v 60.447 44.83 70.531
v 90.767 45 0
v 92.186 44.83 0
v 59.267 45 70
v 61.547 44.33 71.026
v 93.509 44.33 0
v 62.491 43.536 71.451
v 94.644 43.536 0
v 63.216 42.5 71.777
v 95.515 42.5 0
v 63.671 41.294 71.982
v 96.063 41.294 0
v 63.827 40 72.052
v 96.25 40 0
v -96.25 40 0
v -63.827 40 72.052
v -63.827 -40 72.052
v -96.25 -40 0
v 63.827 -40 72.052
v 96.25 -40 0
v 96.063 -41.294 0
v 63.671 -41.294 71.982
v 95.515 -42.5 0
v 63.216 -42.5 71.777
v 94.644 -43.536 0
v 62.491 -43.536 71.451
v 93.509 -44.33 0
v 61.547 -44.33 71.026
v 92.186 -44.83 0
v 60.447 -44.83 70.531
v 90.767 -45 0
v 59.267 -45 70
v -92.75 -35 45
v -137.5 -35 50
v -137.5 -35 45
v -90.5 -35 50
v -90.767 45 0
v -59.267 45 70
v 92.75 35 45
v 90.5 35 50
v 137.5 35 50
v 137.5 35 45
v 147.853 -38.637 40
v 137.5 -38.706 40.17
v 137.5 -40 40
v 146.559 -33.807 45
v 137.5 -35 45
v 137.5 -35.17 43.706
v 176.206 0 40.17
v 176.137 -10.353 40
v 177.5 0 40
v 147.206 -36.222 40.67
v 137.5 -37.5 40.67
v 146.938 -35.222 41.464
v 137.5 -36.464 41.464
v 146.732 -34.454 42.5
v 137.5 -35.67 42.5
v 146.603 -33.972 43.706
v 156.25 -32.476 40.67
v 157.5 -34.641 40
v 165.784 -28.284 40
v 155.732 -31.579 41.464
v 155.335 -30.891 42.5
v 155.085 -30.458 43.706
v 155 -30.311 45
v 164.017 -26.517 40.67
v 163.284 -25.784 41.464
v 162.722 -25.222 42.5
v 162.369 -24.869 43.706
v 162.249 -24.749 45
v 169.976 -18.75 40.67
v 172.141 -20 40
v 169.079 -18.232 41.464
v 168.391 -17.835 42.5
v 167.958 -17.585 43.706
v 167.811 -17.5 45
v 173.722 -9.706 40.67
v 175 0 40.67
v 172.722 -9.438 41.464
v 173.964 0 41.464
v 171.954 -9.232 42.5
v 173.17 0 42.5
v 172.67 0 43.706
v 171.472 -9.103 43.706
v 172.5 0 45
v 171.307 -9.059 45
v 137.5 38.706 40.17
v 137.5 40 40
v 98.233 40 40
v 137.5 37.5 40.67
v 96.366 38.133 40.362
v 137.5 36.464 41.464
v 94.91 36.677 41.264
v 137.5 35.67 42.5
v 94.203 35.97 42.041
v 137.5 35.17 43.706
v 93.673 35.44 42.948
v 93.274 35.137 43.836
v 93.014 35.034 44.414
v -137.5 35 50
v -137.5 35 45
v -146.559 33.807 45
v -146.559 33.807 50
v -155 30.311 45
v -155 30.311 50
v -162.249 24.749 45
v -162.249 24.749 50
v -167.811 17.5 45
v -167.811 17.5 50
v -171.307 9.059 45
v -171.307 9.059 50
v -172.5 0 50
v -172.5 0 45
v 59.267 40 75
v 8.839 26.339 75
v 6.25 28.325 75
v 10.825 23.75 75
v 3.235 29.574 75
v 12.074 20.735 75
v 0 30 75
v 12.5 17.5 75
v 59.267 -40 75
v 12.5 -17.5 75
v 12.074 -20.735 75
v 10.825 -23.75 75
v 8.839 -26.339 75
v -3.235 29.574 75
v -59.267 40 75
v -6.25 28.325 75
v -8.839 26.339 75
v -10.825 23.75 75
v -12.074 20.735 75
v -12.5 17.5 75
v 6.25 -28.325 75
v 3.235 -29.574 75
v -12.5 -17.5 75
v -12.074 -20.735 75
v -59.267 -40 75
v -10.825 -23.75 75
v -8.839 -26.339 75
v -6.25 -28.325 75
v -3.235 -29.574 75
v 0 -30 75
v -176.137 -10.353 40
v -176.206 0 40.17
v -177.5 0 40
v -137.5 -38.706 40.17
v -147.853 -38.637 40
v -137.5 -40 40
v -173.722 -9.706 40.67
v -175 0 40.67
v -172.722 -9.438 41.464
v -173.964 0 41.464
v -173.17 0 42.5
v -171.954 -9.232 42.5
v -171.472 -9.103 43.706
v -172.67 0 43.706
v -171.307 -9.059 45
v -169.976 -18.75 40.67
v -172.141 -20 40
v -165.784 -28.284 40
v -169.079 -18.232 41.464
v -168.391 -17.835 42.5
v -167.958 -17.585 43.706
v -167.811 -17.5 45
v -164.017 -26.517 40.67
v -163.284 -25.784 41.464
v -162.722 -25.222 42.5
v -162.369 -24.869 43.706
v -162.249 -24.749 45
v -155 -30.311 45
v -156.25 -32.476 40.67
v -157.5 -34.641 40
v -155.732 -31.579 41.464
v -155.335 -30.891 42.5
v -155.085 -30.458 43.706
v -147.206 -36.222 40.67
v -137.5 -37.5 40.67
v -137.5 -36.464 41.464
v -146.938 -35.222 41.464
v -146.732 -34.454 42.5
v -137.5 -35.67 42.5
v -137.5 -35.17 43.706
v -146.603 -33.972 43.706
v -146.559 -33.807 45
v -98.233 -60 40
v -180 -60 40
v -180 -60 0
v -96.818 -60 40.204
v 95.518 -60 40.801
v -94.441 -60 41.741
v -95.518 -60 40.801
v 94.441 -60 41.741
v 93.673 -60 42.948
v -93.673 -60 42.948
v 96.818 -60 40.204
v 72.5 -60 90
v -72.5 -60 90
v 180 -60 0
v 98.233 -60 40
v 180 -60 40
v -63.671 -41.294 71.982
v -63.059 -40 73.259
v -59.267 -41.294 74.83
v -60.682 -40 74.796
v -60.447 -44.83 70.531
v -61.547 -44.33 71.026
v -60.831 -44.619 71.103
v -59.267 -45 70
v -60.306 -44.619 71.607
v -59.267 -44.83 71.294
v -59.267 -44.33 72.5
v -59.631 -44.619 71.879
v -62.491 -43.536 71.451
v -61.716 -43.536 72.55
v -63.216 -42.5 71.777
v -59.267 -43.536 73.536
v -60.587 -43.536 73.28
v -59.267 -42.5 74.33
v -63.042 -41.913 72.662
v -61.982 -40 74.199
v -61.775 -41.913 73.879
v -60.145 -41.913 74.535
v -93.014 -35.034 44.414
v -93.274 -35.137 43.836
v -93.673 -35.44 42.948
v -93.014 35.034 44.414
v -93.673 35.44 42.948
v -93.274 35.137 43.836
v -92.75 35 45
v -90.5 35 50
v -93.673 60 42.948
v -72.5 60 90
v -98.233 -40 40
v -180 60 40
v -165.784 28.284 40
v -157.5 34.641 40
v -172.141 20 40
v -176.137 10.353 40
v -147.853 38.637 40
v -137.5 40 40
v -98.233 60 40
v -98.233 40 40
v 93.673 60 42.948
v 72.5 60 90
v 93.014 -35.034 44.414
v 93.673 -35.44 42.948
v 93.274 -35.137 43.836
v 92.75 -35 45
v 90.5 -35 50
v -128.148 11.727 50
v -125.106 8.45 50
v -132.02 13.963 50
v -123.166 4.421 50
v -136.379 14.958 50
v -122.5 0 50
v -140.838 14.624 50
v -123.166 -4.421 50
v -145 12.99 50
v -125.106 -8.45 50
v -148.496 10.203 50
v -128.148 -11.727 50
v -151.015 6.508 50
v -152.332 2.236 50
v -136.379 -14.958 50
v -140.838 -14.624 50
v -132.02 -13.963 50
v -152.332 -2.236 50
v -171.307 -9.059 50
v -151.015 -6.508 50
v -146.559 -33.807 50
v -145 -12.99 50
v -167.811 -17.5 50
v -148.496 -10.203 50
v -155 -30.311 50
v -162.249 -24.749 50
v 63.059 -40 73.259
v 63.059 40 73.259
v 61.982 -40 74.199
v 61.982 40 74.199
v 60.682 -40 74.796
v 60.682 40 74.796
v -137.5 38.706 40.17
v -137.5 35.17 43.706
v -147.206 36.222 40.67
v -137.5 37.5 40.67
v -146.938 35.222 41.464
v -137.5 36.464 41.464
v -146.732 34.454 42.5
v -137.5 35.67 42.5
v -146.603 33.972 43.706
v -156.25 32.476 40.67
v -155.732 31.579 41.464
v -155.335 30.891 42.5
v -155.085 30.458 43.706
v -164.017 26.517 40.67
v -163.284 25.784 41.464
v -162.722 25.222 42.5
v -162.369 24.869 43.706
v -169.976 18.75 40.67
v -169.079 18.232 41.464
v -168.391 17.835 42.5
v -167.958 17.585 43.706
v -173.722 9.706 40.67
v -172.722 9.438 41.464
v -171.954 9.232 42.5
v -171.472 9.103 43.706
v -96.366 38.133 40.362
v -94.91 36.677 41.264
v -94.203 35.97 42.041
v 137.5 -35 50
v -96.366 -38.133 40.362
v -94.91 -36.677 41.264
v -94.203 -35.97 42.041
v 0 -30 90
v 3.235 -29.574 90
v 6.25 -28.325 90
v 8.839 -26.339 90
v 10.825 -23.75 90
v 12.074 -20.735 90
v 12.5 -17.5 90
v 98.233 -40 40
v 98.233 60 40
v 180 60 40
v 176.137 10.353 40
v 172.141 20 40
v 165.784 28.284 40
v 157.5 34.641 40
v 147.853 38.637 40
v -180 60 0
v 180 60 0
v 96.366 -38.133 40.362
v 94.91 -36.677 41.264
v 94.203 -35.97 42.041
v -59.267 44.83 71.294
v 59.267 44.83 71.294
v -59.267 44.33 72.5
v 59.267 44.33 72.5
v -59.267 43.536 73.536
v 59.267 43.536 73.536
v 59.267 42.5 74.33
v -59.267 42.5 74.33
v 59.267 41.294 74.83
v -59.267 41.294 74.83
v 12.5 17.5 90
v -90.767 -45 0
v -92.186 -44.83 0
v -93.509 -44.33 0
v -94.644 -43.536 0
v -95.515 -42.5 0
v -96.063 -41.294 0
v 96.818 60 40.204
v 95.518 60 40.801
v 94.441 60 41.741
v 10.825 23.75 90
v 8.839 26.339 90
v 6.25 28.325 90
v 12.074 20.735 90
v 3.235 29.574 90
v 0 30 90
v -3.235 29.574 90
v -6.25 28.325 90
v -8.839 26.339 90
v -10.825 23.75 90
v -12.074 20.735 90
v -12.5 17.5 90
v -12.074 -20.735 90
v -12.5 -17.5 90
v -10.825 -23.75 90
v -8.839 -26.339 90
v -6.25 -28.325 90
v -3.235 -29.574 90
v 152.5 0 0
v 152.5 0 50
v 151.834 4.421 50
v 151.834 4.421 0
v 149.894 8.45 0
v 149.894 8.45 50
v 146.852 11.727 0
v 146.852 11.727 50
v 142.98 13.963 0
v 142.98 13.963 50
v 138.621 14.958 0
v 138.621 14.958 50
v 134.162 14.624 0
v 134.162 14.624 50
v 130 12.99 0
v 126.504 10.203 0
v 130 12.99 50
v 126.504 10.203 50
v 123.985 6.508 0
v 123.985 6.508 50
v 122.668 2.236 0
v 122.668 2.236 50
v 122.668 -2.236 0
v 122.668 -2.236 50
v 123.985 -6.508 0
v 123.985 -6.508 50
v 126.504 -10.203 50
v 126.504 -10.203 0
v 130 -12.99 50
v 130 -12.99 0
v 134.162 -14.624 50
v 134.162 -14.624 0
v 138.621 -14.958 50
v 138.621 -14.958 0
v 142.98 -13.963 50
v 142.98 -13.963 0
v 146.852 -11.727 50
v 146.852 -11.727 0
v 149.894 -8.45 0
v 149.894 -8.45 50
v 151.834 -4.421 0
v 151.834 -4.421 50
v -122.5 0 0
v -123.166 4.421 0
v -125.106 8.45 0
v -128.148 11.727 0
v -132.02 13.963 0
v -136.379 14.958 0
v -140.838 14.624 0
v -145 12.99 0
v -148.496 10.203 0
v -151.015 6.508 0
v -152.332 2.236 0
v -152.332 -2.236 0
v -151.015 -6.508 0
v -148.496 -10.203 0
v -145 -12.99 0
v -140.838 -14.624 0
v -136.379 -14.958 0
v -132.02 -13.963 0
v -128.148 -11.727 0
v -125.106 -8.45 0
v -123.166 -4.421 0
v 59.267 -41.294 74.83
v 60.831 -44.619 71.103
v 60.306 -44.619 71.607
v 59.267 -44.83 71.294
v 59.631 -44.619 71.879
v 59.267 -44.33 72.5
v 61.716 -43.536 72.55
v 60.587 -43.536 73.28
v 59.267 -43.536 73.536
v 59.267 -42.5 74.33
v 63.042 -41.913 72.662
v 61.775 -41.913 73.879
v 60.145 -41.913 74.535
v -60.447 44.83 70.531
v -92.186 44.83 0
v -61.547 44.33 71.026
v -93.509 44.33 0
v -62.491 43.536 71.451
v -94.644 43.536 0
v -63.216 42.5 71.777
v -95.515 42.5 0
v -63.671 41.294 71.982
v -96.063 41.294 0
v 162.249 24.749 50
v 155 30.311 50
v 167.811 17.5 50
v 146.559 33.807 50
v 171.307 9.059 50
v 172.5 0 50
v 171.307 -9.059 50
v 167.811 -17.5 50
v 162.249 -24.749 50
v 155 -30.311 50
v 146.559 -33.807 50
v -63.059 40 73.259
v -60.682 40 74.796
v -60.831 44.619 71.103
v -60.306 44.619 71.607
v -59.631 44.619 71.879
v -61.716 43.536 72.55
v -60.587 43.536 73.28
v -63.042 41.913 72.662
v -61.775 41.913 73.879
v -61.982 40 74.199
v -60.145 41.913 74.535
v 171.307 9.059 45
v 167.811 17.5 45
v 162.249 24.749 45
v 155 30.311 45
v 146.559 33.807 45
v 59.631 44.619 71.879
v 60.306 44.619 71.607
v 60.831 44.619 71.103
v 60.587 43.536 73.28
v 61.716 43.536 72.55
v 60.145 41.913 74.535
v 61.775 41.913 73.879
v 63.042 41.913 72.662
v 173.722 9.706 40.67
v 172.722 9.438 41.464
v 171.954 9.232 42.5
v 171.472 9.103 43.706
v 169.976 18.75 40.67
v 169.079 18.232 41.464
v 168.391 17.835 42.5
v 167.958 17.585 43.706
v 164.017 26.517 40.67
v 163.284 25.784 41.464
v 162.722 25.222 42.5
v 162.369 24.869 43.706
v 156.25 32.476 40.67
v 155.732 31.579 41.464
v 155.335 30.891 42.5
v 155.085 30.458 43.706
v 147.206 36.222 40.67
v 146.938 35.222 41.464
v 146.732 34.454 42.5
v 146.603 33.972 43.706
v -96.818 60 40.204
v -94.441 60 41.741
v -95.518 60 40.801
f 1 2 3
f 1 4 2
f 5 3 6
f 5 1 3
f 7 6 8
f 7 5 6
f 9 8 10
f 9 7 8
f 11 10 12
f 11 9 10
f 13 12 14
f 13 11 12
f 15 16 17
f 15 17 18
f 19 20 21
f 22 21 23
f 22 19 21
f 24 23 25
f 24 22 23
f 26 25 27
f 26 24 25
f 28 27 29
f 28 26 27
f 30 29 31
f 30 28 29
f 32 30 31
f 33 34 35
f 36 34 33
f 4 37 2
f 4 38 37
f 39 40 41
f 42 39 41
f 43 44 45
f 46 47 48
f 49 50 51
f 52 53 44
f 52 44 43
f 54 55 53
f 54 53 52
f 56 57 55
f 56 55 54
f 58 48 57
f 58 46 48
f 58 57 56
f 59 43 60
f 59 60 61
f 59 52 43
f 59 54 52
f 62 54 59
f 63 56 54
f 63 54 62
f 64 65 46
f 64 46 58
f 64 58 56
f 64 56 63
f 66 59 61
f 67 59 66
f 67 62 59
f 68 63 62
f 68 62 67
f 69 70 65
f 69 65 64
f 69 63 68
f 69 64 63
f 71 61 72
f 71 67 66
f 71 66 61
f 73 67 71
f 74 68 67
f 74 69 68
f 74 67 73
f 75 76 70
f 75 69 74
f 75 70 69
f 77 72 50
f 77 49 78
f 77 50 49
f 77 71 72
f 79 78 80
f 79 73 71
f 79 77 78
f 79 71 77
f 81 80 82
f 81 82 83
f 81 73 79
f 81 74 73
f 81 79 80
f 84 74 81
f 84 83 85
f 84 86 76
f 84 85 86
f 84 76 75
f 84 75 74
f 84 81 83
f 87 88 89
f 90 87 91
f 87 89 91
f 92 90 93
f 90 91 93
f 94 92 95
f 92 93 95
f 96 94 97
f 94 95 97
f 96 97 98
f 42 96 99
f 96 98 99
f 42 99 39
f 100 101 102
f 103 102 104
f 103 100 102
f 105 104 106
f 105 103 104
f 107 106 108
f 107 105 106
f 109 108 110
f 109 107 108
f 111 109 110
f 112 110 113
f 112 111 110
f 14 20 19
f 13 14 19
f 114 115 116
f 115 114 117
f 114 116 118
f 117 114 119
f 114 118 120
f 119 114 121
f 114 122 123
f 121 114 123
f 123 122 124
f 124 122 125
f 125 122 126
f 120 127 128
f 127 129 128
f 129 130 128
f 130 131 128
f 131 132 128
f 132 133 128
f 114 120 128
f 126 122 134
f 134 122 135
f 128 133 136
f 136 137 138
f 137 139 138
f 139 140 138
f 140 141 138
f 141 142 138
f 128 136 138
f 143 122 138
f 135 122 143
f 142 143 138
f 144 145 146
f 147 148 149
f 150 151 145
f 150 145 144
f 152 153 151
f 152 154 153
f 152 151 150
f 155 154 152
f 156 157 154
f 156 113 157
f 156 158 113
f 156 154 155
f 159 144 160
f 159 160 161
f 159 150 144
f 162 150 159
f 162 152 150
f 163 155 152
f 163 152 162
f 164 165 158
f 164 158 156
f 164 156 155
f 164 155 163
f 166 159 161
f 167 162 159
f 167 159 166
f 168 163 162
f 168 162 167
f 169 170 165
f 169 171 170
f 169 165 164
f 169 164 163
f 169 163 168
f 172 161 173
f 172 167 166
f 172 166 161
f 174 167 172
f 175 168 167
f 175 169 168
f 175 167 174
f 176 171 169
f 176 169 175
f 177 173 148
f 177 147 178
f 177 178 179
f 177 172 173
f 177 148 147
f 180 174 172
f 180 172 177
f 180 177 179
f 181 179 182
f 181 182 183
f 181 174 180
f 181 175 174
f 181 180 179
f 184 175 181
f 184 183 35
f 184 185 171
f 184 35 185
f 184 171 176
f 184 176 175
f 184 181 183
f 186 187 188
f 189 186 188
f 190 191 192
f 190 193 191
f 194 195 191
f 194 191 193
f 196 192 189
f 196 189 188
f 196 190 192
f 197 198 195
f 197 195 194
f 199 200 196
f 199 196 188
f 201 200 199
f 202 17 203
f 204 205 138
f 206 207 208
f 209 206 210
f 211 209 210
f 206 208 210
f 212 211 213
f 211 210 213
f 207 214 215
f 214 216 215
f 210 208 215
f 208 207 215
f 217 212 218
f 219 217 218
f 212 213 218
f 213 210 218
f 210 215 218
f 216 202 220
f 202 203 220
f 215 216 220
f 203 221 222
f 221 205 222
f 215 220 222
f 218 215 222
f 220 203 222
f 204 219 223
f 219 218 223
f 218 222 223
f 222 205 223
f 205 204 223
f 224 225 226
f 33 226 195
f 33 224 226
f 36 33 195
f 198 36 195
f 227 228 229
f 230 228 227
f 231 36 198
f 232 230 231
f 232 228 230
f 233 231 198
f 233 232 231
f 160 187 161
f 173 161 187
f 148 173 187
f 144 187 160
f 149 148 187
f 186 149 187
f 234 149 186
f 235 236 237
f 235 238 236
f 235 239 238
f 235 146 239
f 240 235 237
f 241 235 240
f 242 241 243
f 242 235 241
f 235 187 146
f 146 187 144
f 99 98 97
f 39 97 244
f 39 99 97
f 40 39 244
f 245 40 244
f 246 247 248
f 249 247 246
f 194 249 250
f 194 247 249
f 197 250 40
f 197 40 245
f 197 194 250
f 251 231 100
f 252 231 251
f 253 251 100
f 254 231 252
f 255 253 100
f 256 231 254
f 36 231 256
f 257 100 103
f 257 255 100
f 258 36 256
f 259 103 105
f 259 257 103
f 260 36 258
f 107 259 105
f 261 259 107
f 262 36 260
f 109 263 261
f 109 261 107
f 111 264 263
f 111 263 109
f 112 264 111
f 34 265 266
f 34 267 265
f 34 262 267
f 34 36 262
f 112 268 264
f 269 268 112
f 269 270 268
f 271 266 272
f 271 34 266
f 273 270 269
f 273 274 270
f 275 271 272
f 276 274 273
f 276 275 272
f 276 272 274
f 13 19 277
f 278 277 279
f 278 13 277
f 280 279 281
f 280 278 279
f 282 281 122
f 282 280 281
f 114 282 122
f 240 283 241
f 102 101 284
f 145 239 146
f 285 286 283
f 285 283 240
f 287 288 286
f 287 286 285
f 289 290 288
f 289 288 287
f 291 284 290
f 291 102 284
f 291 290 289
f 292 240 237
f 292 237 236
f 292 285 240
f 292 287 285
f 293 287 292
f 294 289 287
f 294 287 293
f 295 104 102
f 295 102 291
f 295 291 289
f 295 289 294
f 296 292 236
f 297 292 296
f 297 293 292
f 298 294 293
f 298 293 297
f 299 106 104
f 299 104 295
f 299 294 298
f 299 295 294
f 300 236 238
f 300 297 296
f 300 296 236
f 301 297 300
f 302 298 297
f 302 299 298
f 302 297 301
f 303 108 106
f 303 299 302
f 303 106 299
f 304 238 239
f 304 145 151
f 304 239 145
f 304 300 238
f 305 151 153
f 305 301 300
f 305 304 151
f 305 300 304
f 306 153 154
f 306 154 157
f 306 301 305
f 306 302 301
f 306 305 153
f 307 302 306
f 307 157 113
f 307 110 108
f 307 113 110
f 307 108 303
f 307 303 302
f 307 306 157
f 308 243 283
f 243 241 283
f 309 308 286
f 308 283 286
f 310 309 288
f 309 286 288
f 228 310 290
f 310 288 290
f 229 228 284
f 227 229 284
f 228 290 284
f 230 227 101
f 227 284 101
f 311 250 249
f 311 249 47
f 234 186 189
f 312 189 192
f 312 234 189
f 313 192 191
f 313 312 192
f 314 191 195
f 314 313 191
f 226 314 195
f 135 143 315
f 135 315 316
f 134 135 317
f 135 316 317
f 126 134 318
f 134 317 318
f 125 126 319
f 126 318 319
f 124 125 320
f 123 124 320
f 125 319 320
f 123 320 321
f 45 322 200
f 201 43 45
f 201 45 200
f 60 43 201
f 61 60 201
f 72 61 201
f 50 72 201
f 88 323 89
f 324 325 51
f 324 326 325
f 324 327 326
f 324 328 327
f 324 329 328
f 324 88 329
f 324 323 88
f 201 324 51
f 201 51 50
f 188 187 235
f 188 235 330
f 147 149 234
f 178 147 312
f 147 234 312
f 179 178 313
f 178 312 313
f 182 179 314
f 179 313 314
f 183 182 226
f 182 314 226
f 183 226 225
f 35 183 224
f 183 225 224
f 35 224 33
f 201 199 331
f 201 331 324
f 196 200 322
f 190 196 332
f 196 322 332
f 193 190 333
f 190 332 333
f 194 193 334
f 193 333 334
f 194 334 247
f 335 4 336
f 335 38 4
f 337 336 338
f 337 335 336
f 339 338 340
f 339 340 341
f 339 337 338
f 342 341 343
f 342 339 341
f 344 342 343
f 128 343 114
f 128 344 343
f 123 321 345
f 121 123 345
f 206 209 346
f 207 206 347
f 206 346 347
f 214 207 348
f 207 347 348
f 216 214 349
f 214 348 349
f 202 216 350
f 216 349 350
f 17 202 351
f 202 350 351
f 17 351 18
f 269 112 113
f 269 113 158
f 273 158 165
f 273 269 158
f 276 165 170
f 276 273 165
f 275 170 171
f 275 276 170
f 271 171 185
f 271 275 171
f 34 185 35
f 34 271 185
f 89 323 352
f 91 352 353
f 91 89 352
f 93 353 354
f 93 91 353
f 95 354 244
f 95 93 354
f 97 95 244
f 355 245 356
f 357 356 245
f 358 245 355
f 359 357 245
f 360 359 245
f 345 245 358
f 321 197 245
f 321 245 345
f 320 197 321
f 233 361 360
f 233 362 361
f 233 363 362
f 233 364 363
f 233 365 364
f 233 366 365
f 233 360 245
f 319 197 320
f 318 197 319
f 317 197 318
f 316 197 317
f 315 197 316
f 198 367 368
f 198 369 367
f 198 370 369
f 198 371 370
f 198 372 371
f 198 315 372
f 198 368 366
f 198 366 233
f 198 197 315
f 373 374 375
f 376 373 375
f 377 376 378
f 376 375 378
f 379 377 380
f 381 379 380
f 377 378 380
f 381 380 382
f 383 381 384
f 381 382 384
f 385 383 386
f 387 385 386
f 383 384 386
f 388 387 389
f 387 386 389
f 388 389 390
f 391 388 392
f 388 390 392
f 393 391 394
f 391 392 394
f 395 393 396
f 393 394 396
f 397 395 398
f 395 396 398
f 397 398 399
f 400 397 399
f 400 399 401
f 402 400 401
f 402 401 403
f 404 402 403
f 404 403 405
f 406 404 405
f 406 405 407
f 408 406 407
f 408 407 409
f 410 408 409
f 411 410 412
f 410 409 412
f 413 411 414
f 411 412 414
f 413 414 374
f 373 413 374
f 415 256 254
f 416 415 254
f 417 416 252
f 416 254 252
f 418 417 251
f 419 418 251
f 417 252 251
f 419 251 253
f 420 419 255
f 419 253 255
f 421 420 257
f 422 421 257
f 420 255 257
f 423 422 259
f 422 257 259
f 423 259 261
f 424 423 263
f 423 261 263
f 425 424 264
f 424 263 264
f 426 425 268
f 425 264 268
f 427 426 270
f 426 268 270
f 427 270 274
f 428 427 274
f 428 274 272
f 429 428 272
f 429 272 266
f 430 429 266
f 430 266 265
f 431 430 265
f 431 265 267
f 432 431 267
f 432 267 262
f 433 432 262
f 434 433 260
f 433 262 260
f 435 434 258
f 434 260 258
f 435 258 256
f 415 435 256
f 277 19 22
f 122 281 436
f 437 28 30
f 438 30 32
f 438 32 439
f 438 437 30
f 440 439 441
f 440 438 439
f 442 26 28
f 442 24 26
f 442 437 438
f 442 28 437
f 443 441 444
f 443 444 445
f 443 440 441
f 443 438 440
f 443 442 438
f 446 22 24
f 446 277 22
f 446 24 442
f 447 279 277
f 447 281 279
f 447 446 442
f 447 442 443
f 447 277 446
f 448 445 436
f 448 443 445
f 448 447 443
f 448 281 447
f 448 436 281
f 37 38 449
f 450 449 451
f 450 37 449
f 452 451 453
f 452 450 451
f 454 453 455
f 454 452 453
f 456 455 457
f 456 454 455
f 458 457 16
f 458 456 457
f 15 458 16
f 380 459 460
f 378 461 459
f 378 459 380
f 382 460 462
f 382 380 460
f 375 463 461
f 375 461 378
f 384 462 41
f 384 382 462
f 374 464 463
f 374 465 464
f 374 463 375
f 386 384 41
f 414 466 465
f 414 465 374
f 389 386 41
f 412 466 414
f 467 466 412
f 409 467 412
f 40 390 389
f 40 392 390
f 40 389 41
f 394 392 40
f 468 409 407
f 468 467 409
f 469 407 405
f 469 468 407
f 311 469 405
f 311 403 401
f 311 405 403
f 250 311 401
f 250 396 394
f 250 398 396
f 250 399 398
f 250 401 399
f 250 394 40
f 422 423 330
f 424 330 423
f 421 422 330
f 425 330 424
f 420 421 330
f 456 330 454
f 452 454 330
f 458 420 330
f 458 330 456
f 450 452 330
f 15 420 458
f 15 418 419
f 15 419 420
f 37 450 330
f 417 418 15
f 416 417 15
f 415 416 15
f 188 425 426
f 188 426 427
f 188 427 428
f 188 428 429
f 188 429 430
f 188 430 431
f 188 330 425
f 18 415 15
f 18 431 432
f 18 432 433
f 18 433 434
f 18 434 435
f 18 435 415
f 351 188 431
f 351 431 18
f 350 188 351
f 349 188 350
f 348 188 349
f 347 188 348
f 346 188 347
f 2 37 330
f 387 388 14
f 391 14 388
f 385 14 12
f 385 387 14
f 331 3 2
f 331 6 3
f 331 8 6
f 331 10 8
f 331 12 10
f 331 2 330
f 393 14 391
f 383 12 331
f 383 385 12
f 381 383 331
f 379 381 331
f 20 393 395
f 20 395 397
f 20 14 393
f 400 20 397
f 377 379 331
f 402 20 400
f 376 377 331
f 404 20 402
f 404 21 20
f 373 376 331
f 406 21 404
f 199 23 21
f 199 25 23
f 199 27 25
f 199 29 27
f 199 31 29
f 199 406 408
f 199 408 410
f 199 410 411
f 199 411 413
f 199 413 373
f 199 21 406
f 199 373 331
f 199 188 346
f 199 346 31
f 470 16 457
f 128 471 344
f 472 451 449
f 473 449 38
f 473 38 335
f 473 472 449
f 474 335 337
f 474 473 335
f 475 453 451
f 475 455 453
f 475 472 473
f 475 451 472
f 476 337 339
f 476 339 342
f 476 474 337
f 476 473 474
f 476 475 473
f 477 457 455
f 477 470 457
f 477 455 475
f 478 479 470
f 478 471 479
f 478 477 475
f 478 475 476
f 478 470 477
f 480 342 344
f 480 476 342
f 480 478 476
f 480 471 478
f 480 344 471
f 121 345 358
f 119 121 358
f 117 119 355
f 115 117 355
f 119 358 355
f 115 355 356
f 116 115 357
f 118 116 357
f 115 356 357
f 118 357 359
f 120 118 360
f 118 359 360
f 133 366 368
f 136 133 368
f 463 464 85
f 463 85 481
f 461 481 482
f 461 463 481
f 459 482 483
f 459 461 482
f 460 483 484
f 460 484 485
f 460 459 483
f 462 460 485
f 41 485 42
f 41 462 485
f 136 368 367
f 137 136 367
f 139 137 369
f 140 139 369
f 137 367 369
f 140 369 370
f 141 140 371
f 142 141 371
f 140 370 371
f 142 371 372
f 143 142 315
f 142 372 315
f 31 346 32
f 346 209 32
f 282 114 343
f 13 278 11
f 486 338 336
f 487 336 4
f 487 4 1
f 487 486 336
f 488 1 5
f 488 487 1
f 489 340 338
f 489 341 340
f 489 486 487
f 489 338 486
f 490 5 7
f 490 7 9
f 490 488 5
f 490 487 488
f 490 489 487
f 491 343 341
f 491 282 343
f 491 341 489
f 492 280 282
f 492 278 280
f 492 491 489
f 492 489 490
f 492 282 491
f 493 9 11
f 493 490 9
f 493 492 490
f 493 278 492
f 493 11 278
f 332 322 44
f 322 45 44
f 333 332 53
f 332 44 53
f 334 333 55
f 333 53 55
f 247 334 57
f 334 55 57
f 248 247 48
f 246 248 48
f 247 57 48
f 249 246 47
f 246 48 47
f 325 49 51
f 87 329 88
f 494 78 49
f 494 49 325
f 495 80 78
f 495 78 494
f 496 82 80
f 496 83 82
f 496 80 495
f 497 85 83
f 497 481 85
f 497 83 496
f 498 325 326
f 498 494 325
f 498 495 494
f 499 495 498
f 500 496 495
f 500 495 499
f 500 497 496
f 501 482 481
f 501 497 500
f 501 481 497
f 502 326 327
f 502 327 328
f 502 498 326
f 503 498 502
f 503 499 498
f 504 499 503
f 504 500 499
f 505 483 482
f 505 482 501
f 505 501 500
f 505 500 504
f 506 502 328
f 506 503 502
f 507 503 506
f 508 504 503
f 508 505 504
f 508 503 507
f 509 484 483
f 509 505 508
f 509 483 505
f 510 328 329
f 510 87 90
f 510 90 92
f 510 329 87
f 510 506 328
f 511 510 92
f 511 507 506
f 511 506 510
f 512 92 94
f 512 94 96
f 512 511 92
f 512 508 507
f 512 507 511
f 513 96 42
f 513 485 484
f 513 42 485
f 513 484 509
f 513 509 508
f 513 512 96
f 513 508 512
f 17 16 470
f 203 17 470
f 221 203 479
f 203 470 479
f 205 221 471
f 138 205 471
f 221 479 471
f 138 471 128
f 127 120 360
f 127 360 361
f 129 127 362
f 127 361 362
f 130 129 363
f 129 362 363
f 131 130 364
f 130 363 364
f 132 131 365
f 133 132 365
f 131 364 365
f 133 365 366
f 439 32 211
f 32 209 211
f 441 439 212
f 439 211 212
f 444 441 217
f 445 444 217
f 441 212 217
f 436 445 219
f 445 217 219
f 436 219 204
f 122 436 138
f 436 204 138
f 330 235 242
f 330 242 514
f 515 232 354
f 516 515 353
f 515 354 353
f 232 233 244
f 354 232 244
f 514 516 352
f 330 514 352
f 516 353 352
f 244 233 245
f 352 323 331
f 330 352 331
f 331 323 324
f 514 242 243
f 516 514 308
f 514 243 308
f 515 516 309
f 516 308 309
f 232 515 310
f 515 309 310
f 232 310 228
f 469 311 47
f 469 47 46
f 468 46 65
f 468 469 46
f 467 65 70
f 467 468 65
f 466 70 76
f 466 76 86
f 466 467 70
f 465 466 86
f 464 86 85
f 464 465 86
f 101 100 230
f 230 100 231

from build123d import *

# Parameters (mm, degrees)
F1_DEPTH  = 60
F3_DEPTH  = 25
F4_W      = 7.5
F4_H      = 10
F5_DEPTH  = 70
F6_R      = 34.99999
F7_R      = 5
F8_R      = 15
F9_DEPTH  = 50
F11_DEPTH = 90
F13_DEPTH = 45
F14_R     = 5


# Not quite as in the source:
# - a fillet or chamfer is up to 0.001 mm smaller than in the source, because OpenCascade refuses the exact size
# - a pattern or mirror of a feature is missing from the dataset's text; its kind, count and spacing are read off the source's solid


with BuildPart() as f1:
    # F0 (on Front) → F1 (new body, symmetric)
    with BuildSketch(Plane.XZ):
        Polygon((-180, 0), (0, 0), (180, 0), (180, 50), (90.5, 50), (72.5, 90), (0, 90), (-72.5, 90), (-90.5, 50), (-180, 50), align=None)
    extrude(amount=F1_DEPTH, both=True)

    # F2 (on face) → F3 (cut)
    with BuildSketch(Plane.XZ.offset(60)):
        Polygon((-95, 40), (-90.5, 50), (-180, 50), (-180, 40), align=None)
        Polygon((180, 50), (90.5, 50), (95, 40), (180, 40), align=None)
    f3 = extrude(amount=-F3_DEPTH, mode=Mode.SUBTRACT)

    # F3_copies: F3 across plane
    add(f3.mirror(Plane.ZX), mode=Mode.SUBTRACT)

    # F4 (on face) → F5 (cut)
    with BuildSketch(Plane.XZ.offset(35)):
        with Locations((-176.25, 45)):
            Rectangle(F4_W, F4_H)
        with Locations((176.25, 45)):
            Rectangle(F4_W, F4_H)
    extrude(amount=-F5_DEPTH, mode=Mode.SUBTRACT)

    # F6 (radius 35 in the source; OpenCascade refuses exactly that, so slightly less here)
    f6_edges = [f1.edges().sort_by_distance(p)[0] for p in [
        (172.5, -35, 45),
        (172.5, 35, 45),
        (-172.5, -35, 45),
        (-172.5, 35, 45),
    ]]
    fillet(f6_edges, radius=F6_R)

    # F7
    f7_edges = [f1.edges().sort_by_distance(p)[0] for p in [
        (116.250005, -35, 40),
        (95, -47.5, 40),
        (-116.250005, -35, 40),
        (-95, -47.5, 40),
        (-162.24874, -24.74874, 40),
        (-172.5, 0, 40),
        (-162.24874, 24.74874, 40),
        (-116.250005, 35, 40),
        (-95, 47.5, 40),
        (116.250005, 35, 40),
        (162.24874, 24.74874, 40),
        (95, 47.5, 40),
        (172.5, 0, 40),
        (162.24874, -24.74874, 40),
    ]]
    fillet(f7_edges, radius=F7_R)

    # F8 (on face) → F9 (cut)
    with BuildSketch(Plane.XY.offset(50)):
        with Locations((-137.5, 0)):
            Circle(F8_R)
        with Locations((137.5, 0)):
            Circle(F8_R)
    extrude(amount=-F9_DEPTH, mode=Mode.SUBTRACT)

    # F10 (on face) → F11 (cut)
    with BuildSketch(Plane.XY.offset(90)):
        with BuildLine():
            ThreePointArc((0, 30), (-8.8388347648, 26.3388347648), (-12.5, 17.5))
            Line((-12.5, 17.5), (-12.5, -17.5))
            ThreePointArc((-12.5, -17.5), (-8.8388347648, -26.3388347648), (0, -30))
            ThreePointArc((0, -30), (8.8388347648, -26.3388347648), (12.5, -17.5))
            Line((12.5, -17.5), (12.5, 17.5))
            ThreePointArc((12.5, 17.5), (8.8388347648, 26.3388347648), (0, 30))
        make_face()
    extrude(amount=-F11_DEPTH, mode=Mode.SUBTRACT)

    # F12 (on Front) → F13 (cut, symmetric)
    with BuildSketch(Plane.XZ):
        Polygon((-62.5, 75), (-96.25, 0), (0, 0), (96.25, 0), (62.5, 75), (0, 75), align=None)
    extrude(amount=F13_DEPTH, both=True, mode=Mode.SUBTRACT)

    # F14
    f14_edges = [f1.edges().sort_by_distance(p)[0] for p in [
        (79.375, -45, 37.5),
        (0, -45, 75),
        (62.5, 0, 75),
        (-62.5, 0, 75),
        (-79.375, -45, 37.5),
        (-79.375, 45, 37.5),
        (0, 45, 75),
        (79.375, 45, 37.5),
    ]]
    fillet(f14_edges, radius=F14_R)


solid = f1.part
